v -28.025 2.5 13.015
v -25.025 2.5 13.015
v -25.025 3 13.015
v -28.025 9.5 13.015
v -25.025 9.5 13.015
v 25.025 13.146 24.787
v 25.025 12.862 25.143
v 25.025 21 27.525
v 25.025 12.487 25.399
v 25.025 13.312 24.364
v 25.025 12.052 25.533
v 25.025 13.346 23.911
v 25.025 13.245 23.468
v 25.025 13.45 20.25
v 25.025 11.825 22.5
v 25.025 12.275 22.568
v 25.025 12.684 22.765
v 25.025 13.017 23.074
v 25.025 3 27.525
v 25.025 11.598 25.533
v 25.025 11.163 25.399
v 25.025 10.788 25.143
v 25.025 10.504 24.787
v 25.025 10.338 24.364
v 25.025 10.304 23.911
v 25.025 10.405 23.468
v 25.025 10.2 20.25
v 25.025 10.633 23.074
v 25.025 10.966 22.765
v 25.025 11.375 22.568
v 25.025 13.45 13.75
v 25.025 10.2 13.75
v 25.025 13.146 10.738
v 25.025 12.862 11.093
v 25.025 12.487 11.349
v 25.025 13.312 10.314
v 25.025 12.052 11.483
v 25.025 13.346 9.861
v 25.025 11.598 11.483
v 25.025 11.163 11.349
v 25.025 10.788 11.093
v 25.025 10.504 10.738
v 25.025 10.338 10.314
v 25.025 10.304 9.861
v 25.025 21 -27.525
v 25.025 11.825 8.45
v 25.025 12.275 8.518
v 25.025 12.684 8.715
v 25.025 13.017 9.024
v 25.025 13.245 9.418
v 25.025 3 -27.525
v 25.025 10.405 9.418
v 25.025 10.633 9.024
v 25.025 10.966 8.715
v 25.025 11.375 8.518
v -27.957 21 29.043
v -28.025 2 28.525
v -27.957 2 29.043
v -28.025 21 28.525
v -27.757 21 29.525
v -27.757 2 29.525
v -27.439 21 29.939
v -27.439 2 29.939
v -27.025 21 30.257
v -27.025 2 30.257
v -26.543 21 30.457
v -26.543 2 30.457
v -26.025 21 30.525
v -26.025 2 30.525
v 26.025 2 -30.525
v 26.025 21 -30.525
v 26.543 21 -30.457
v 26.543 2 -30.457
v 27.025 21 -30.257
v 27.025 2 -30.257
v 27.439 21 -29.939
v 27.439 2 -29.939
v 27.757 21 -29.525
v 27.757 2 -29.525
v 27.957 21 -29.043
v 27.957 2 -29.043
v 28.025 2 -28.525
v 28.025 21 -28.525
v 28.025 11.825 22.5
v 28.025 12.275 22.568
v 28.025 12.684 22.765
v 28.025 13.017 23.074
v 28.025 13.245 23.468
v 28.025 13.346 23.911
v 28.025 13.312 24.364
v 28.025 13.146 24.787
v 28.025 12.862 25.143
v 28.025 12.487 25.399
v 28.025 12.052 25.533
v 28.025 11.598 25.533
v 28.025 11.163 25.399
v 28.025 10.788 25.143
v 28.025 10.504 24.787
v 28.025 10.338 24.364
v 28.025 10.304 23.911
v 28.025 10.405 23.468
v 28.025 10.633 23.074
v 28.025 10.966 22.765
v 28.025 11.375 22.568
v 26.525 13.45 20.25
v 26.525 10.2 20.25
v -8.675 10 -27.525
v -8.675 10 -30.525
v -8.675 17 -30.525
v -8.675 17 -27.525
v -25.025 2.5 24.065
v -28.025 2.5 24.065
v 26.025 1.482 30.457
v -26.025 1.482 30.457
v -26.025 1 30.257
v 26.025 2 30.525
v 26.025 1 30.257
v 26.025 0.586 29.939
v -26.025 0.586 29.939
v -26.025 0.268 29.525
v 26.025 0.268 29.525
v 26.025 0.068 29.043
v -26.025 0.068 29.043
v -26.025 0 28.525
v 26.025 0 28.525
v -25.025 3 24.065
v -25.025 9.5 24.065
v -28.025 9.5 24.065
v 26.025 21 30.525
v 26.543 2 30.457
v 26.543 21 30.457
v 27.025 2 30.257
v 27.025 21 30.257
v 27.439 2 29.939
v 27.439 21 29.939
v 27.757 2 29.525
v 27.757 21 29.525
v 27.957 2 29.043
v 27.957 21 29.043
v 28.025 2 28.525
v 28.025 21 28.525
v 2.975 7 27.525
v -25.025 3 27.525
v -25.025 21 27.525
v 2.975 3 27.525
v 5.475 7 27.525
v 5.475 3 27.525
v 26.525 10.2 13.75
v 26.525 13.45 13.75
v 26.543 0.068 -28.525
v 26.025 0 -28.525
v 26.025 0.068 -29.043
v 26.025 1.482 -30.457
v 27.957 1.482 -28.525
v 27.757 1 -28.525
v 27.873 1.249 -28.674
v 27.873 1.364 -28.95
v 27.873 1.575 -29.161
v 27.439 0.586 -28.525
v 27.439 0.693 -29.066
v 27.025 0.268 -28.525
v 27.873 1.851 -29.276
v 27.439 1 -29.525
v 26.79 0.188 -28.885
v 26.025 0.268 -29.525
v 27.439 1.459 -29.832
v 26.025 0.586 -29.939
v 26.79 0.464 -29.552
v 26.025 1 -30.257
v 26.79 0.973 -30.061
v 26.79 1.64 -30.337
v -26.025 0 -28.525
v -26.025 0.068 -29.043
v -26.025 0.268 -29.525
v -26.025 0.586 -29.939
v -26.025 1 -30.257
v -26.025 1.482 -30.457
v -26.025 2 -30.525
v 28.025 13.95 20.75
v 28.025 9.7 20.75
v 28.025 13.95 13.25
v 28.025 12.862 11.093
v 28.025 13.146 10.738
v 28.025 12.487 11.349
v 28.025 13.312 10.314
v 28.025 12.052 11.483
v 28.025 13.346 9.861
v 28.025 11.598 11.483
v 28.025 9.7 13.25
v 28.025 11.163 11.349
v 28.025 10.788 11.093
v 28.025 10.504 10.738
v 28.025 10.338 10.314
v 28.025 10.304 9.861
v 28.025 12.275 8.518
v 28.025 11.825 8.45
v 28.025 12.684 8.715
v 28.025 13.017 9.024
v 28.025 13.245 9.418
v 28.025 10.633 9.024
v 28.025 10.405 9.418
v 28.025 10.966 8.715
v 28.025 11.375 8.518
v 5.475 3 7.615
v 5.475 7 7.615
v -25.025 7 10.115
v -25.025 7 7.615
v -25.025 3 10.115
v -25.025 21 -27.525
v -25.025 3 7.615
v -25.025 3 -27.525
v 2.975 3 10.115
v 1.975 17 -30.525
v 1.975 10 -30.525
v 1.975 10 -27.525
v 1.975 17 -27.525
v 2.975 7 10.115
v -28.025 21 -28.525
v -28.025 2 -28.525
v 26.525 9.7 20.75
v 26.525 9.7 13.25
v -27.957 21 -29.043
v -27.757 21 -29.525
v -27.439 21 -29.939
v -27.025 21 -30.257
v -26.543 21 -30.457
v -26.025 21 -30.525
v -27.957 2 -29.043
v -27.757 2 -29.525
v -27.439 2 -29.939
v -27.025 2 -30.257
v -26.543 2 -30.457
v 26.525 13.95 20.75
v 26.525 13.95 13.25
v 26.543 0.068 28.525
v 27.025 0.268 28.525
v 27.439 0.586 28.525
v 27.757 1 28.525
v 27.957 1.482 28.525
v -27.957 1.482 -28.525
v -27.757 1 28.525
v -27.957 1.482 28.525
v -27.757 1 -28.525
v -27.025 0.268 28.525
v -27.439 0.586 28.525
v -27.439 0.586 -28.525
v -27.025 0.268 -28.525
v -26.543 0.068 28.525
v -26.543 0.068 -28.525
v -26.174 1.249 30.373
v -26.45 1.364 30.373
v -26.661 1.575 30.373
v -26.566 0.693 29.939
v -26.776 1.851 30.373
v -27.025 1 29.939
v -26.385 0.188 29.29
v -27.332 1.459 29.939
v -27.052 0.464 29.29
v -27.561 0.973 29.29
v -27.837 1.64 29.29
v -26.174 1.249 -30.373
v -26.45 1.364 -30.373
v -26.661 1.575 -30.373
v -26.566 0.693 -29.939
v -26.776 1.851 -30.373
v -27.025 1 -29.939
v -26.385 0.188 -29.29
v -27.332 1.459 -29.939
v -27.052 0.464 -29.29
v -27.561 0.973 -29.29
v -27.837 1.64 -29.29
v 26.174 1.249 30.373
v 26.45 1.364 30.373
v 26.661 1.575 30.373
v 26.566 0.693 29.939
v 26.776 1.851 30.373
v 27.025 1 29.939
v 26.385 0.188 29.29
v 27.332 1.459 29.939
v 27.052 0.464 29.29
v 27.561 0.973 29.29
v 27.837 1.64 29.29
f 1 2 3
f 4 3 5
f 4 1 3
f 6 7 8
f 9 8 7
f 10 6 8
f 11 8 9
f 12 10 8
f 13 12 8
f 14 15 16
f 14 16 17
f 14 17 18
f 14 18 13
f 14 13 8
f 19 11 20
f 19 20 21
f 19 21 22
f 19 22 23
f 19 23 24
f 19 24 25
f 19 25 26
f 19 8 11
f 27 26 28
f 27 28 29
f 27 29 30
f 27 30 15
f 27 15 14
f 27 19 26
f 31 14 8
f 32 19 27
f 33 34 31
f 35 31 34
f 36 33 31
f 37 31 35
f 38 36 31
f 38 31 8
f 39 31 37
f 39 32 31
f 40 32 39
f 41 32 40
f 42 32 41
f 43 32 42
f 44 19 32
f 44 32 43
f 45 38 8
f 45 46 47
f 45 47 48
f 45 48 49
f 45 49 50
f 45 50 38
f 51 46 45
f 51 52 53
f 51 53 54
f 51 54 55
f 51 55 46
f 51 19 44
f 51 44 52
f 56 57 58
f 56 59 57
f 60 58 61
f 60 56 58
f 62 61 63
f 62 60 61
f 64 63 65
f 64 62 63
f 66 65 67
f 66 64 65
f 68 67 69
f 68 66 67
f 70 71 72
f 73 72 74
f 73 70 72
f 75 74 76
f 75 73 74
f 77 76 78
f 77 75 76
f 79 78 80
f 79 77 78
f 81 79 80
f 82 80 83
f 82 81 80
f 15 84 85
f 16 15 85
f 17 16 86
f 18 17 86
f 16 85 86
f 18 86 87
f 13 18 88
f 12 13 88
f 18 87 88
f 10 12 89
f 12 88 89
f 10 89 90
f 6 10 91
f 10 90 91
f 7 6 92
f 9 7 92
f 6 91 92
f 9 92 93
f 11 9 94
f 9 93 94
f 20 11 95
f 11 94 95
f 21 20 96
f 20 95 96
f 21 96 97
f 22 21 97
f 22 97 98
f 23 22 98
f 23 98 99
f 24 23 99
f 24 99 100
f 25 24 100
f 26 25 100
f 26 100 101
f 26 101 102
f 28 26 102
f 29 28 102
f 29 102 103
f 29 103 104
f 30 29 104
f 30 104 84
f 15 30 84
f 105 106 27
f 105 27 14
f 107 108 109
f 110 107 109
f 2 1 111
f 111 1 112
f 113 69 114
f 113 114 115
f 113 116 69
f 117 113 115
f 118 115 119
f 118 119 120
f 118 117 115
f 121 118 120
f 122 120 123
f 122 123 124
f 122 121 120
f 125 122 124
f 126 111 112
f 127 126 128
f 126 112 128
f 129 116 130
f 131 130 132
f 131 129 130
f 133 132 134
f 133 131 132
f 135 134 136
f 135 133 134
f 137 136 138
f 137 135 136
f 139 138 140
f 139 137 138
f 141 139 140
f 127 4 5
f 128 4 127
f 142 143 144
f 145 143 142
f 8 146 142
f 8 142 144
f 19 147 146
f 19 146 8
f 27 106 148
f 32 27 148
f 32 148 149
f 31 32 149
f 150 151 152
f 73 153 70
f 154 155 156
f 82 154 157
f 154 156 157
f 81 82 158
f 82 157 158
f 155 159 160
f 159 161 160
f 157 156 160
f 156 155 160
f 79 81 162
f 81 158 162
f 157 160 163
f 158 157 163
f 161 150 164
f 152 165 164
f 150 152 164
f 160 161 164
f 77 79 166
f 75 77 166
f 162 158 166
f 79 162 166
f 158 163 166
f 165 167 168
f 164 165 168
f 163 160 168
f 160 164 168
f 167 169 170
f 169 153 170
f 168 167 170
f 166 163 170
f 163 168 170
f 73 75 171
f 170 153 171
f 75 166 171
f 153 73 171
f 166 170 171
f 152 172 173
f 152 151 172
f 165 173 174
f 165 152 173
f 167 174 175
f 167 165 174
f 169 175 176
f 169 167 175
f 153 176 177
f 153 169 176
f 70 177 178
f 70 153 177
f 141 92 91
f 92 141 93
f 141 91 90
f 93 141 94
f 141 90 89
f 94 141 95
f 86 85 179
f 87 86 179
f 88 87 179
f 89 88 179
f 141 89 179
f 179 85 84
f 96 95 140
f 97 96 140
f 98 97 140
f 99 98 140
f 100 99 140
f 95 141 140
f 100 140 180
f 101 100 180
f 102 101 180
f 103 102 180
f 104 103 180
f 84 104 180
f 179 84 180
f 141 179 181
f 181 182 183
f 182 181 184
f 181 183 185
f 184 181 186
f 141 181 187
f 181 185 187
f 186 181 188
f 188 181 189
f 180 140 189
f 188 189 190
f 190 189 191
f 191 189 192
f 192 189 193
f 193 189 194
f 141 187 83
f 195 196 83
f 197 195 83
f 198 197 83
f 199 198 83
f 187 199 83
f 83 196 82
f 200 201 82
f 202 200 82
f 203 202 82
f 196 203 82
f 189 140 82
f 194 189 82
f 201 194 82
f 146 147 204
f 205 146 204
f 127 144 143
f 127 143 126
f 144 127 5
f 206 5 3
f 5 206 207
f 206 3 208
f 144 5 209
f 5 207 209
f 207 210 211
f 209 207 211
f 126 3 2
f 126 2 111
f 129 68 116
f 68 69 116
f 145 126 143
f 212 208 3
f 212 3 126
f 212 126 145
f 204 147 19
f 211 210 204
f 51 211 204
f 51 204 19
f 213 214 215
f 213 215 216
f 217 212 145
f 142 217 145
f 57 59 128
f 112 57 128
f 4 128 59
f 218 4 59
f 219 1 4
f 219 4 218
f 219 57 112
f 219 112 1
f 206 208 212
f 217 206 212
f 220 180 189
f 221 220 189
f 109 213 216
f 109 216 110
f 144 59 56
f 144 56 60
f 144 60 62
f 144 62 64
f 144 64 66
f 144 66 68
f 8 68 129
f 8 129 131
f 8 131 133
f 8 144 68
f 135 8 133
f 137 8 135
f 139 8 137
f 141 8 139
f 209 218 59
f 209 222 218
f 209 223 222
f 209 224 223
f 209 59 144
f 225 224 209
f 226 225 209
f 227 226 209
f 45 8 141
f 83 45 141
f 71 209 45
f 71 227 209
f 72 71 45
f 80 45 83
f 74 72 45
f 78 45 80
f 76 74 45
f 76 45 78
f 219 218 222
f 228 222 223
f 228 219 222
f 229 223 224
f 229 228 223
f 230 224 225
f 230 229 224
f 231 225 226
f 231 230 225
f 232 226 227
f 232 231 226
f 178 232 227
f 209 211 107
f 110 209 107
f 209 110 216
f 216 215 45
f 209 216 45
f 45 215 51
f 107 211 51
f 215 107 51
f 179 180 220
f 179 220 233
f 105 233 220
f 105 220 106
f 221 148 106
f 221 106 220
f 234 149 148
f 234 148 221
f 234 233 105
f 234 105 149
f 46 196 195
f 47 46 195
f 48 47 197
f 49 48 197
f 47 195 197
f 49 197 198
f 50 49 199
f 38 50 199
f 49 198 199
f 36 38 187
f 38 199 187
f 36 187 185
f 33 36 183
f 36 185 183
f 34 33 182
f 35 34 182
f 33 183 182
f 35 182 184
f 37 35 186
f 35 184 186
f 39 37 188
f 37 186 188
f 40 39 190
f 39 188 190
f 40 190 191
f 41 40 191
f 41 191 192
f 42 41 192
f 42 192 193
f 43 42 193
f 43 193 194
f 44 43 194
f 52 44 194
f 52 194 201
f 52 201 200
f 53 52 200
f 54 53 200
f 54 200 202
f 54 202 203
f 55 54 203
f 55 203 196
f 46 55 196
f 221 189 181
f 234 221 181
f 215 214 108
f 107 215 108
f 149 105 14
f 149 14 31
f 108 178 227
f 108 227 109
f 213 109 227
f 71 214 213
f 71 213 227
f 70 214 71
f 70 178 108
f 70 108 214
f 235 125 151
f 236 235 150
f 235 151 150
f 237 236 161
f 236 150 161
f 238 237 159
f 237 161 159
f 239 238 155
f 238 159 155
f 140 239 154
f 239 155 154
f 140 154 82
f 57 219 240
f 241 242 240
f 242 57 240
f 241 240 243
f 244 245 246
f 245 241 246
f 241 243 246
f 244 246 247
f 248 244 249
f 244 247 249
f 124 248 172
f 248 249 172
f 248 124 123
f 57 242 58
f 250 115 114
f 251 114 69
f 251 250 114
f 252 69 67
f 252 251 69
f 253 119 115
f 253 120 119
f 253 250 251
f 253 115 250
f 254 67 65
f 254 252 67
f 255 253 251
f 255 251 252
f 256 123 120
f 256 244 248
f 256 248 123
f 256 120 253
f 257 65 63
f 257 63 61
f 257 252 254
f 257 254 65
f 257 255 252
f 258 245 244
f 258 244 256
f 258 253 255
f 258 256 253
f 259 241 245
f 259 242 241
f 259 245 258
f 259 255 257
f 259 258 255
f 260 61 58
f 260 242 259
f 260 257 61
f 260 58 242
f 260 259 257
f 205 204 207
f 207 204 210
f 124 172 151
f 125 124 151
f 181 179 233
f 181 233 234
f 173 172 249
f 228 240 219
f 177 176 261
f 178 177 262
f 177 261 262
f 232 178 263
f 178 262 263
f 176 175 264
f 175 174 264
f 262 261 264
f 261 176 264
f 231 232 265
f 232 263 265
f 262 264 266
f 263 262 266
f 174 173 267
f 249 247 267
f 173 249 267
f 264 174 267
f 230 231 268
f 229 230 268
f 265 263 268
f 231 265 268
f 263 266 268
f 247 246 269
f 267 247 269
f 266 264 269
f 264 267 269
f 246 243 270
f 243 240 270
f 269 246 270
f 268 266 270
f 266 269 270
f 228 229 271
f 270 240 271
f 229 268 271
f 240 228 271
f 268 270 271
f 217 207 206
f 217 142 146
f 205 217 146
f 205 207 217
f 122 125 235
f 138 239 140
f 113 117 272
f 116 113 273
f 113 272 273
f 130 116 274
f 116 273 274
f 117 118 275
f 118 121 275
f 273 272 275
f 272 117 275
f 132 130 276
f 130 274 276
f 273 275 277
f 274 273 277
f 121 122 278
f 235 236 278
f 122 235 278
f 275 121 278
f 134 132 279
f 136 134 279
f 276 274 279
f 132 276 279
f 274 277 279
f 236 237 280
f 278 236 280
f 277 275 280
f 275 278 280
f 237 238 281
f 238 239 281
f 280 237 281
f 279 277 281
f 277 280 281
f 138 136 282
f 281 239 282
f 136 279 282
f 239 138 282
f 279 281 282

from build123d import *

# Parameters (mm, degrees)
SKETCH1_W           = 56.05
SKETCH1_H           = 61.05
SKETCH1_W_2         = 50.05
SKETCH1_H_2         = 55.05
BOSS_EXTRUDE1_DEPTH = 3
SKETCH1_3_W         = 56.05
SKETCH1_3_H         = 61.05
SKETCH1_3_W_2       = 50.05
SKETCH1_3_H_2       = 55.05
BOSS_EXTRUDE2_DEPTH = 21
CUT_EXTRUDE1_REACH  = 58.05
SKETCH2_R           = 1.525
SKETCH2_W           = 6.5
SKETCH2_H           = 3.25
CUT_EXTRUDE2_REACH  = 63.05
SKETCH3_W           = 10.65
SKETCH3_H           = 7
SKETCH4_W           = 11.05
SKETCH4_H           = 7
CUT_EXTRUDE3_DEPTH  = 3
BOSS_EXTRUDE3_DEPTH = 4
FILLET1_R           = 2
SKETCH6_W           = 7.5
SKETCH6_H           = 4.25
CUT_EXTRUDE4_DEPTH  = 1.5


with BuildPart() as part:
    # Sketch1 → Boss-Extrude1 (new body)
    with BuildSketch(Plane(origin=(0, 0, 0), x_dir=(1, 0, 0), z_dir=(0, 1, 0))):
        Rectangle(SKETCH1_W, SKETCH1_H)
        Rectangle(SKETCH1_W_2, SKETCH1_H_2, mode=Mode.SUBTRACT)
        Rectangle(SKETCH1_W_2, SKETCH1_H_2)
    extrude(amount=BOSS_EXTRUDE1_DEPTH)

    # Sketch1_3 → Boss-Extrude2 (add)
    with BuildSketch(Plane(origin=(0, 0, 0), x_dir=(1, 0, 0), z_dir=(0, 1, 0))):
        Rectangle(SKETCH1_3_W, SKETCH1_3_H)
        Rectangle(SKETCH1_3_W_2, SKETCH1_3_H_2, mode=Mode.SUBTRACT)
    extrude(amount=BOSS_EXTRUDE2_DEPTH)

    # Sketch2 → Cut-Extrude1 (cut, up to next)
    with BuildSketch(Plane(origin=(28.025, 0, 0), x_dir=(0, 0, -1), z_dir=(1, 0, 0)), mode=Mode.PRIVATE) as cut_extrude1_sk1:
        with Locations((-24.025, 11.825)):
            Circle(SKETCH2_R)
    cut_extrude1_tool1 = extrude(cut_extrude1_sk1.sketch, amount=-CUT_EXTRUDE1_REACH, mode=Mode.PRIVATE) & part.part
    add(cut_extrude1_tool1.solids().sort_by_distance((28.025, 11.825, 24.025))[0], mode=Mode.SUBTRACT)
    # Sketch2 → Cut-Extrude1 (cut, up to next)
    with BuildSketch(Plane(origin=(28.025, 0, 0), x_dir=(0, 0, -1), z_dir=(1, 0, 0)), mode=Mode.PRIVATE) as cut_extrude1_sk2:
        with Locations((-9.975, 11.825)):
            Circle(SKETCH2_R)
    cut_extrude1_tool2 = extrude(cut_extrude1_sk2.sketch, amount=-CUT_EXTRUDE1_REACH, mode=Mode.PRIVATE) & part.part
    add(cut_extrude1_tool2.solids().sort_by_distance((28.025, 11.825, 9.975))[0], mode=Mode.SUBTRACT)
    # Sketch2 → Cut-Extrude1 (cut, up to next)
    with BuildSketch(Plane(origin=(28.025, 0, 0), x_dir=(0, 0, -1), z_dir=(1, 0, 0)), mode=Mode.PRIVATE) as cut_extrude1_sk3:
        with Locations((-17, 11.825)):
            Rectangle(SKETCH2_W, SKETCH2_H)
    cut_extrude1_tool3 = extrude(cut_extrude1_sk3.sketch, amount=-CUT_EXTRUDE1_REACH, mode=Mode.PRIVATE) & part.part
    add(cut_extrude1_tool3.solids().sort_by_distance((28.025, 11.825, 17))[0], mode=Mode.SUBTRACT)

    # Sketch3 → Cut-Extrude2 (cut, up to next)
    with BuildSketch(Plane(origin=(0, 0, -30.525), x_dir=(-1, 0, 0), z_dir=(0, 0, -1)), mode=Mode.PRIVATE) as cut_extrude2_sk1:
        with Locations((3.35, 13.5)):
            Rectangle(SKETCH3_W, SKETCH3_H)
    cut_extrude2_tool1 = extrude(cut_extrude2_sk1.sketch, amount=-CUT_EXTRUDE2_REACH, mode=Mode.PRIVATE) & part.part
    add(cut_extrude2_tool1.solids().sort_by_distance((-3.35, 13.5, -30.525))[0], mode=Mode.SUBTRACT)

    # Sketch4 → Cut-Extrude3 (cut)
    with BuildSketch(Plane.ZY.offset(28.025)):
        with Locations((18.54, 6)):
            Rectangle(SKETCH4_W, SKETCH4_H)
    extrude(amount=-CUT_EXTRUDE3_DEPTH, mode=Mode.SUBTRACT)

    # Sketch5 → Boss-Extrude3 (add)
    with BuildSketch(Plane(origin=(0, 3, 0), x_dir=(1, 0, 0), z_dir=(0, 1, 0))):
        Polygon((5.475, -7.615), (-25.025, -7.615), (-25.025, -10.115), (2.975, -10.115), (2.975, -27.525), (5.475, -27.525), align=None)
    extrude(amount=BOSS_EXTRUDE3_DEPTH)

    # Fillet1
    fillet1_edges = [part.edges().sort_by_distance(p)[0] for p in [
        (-28.025, 0, 0),
        (0, 0, -30.525),
        (28.025, 0, 0),
        (0, 0, 30.525),
        (-28.025, 10.5, 30.525),
        (-28.025, 10.5, -30.525),
        (28.025, 10.5, -30.525),
        (28.025, 10.5, 30.525),
    ]]
    fillet(fillet1_edges, radius=FILLET1_R)

    # Sketch6 → Cut-Extrude4 (cut)
    with BuildSketch(Plane(origin=(28.025, 0, 0), x_dir=(0, 0, -1), z_dir=(1, 0, 0))):
        with Locations((-17, 11.825)):
            Rectangle(SKETCH6_W, SKETCH6_H)
    extrude(amount=-CUT_EXTRUDE4_DEPTH, mode=Mode.SUBTRACT)


solid = part.part
